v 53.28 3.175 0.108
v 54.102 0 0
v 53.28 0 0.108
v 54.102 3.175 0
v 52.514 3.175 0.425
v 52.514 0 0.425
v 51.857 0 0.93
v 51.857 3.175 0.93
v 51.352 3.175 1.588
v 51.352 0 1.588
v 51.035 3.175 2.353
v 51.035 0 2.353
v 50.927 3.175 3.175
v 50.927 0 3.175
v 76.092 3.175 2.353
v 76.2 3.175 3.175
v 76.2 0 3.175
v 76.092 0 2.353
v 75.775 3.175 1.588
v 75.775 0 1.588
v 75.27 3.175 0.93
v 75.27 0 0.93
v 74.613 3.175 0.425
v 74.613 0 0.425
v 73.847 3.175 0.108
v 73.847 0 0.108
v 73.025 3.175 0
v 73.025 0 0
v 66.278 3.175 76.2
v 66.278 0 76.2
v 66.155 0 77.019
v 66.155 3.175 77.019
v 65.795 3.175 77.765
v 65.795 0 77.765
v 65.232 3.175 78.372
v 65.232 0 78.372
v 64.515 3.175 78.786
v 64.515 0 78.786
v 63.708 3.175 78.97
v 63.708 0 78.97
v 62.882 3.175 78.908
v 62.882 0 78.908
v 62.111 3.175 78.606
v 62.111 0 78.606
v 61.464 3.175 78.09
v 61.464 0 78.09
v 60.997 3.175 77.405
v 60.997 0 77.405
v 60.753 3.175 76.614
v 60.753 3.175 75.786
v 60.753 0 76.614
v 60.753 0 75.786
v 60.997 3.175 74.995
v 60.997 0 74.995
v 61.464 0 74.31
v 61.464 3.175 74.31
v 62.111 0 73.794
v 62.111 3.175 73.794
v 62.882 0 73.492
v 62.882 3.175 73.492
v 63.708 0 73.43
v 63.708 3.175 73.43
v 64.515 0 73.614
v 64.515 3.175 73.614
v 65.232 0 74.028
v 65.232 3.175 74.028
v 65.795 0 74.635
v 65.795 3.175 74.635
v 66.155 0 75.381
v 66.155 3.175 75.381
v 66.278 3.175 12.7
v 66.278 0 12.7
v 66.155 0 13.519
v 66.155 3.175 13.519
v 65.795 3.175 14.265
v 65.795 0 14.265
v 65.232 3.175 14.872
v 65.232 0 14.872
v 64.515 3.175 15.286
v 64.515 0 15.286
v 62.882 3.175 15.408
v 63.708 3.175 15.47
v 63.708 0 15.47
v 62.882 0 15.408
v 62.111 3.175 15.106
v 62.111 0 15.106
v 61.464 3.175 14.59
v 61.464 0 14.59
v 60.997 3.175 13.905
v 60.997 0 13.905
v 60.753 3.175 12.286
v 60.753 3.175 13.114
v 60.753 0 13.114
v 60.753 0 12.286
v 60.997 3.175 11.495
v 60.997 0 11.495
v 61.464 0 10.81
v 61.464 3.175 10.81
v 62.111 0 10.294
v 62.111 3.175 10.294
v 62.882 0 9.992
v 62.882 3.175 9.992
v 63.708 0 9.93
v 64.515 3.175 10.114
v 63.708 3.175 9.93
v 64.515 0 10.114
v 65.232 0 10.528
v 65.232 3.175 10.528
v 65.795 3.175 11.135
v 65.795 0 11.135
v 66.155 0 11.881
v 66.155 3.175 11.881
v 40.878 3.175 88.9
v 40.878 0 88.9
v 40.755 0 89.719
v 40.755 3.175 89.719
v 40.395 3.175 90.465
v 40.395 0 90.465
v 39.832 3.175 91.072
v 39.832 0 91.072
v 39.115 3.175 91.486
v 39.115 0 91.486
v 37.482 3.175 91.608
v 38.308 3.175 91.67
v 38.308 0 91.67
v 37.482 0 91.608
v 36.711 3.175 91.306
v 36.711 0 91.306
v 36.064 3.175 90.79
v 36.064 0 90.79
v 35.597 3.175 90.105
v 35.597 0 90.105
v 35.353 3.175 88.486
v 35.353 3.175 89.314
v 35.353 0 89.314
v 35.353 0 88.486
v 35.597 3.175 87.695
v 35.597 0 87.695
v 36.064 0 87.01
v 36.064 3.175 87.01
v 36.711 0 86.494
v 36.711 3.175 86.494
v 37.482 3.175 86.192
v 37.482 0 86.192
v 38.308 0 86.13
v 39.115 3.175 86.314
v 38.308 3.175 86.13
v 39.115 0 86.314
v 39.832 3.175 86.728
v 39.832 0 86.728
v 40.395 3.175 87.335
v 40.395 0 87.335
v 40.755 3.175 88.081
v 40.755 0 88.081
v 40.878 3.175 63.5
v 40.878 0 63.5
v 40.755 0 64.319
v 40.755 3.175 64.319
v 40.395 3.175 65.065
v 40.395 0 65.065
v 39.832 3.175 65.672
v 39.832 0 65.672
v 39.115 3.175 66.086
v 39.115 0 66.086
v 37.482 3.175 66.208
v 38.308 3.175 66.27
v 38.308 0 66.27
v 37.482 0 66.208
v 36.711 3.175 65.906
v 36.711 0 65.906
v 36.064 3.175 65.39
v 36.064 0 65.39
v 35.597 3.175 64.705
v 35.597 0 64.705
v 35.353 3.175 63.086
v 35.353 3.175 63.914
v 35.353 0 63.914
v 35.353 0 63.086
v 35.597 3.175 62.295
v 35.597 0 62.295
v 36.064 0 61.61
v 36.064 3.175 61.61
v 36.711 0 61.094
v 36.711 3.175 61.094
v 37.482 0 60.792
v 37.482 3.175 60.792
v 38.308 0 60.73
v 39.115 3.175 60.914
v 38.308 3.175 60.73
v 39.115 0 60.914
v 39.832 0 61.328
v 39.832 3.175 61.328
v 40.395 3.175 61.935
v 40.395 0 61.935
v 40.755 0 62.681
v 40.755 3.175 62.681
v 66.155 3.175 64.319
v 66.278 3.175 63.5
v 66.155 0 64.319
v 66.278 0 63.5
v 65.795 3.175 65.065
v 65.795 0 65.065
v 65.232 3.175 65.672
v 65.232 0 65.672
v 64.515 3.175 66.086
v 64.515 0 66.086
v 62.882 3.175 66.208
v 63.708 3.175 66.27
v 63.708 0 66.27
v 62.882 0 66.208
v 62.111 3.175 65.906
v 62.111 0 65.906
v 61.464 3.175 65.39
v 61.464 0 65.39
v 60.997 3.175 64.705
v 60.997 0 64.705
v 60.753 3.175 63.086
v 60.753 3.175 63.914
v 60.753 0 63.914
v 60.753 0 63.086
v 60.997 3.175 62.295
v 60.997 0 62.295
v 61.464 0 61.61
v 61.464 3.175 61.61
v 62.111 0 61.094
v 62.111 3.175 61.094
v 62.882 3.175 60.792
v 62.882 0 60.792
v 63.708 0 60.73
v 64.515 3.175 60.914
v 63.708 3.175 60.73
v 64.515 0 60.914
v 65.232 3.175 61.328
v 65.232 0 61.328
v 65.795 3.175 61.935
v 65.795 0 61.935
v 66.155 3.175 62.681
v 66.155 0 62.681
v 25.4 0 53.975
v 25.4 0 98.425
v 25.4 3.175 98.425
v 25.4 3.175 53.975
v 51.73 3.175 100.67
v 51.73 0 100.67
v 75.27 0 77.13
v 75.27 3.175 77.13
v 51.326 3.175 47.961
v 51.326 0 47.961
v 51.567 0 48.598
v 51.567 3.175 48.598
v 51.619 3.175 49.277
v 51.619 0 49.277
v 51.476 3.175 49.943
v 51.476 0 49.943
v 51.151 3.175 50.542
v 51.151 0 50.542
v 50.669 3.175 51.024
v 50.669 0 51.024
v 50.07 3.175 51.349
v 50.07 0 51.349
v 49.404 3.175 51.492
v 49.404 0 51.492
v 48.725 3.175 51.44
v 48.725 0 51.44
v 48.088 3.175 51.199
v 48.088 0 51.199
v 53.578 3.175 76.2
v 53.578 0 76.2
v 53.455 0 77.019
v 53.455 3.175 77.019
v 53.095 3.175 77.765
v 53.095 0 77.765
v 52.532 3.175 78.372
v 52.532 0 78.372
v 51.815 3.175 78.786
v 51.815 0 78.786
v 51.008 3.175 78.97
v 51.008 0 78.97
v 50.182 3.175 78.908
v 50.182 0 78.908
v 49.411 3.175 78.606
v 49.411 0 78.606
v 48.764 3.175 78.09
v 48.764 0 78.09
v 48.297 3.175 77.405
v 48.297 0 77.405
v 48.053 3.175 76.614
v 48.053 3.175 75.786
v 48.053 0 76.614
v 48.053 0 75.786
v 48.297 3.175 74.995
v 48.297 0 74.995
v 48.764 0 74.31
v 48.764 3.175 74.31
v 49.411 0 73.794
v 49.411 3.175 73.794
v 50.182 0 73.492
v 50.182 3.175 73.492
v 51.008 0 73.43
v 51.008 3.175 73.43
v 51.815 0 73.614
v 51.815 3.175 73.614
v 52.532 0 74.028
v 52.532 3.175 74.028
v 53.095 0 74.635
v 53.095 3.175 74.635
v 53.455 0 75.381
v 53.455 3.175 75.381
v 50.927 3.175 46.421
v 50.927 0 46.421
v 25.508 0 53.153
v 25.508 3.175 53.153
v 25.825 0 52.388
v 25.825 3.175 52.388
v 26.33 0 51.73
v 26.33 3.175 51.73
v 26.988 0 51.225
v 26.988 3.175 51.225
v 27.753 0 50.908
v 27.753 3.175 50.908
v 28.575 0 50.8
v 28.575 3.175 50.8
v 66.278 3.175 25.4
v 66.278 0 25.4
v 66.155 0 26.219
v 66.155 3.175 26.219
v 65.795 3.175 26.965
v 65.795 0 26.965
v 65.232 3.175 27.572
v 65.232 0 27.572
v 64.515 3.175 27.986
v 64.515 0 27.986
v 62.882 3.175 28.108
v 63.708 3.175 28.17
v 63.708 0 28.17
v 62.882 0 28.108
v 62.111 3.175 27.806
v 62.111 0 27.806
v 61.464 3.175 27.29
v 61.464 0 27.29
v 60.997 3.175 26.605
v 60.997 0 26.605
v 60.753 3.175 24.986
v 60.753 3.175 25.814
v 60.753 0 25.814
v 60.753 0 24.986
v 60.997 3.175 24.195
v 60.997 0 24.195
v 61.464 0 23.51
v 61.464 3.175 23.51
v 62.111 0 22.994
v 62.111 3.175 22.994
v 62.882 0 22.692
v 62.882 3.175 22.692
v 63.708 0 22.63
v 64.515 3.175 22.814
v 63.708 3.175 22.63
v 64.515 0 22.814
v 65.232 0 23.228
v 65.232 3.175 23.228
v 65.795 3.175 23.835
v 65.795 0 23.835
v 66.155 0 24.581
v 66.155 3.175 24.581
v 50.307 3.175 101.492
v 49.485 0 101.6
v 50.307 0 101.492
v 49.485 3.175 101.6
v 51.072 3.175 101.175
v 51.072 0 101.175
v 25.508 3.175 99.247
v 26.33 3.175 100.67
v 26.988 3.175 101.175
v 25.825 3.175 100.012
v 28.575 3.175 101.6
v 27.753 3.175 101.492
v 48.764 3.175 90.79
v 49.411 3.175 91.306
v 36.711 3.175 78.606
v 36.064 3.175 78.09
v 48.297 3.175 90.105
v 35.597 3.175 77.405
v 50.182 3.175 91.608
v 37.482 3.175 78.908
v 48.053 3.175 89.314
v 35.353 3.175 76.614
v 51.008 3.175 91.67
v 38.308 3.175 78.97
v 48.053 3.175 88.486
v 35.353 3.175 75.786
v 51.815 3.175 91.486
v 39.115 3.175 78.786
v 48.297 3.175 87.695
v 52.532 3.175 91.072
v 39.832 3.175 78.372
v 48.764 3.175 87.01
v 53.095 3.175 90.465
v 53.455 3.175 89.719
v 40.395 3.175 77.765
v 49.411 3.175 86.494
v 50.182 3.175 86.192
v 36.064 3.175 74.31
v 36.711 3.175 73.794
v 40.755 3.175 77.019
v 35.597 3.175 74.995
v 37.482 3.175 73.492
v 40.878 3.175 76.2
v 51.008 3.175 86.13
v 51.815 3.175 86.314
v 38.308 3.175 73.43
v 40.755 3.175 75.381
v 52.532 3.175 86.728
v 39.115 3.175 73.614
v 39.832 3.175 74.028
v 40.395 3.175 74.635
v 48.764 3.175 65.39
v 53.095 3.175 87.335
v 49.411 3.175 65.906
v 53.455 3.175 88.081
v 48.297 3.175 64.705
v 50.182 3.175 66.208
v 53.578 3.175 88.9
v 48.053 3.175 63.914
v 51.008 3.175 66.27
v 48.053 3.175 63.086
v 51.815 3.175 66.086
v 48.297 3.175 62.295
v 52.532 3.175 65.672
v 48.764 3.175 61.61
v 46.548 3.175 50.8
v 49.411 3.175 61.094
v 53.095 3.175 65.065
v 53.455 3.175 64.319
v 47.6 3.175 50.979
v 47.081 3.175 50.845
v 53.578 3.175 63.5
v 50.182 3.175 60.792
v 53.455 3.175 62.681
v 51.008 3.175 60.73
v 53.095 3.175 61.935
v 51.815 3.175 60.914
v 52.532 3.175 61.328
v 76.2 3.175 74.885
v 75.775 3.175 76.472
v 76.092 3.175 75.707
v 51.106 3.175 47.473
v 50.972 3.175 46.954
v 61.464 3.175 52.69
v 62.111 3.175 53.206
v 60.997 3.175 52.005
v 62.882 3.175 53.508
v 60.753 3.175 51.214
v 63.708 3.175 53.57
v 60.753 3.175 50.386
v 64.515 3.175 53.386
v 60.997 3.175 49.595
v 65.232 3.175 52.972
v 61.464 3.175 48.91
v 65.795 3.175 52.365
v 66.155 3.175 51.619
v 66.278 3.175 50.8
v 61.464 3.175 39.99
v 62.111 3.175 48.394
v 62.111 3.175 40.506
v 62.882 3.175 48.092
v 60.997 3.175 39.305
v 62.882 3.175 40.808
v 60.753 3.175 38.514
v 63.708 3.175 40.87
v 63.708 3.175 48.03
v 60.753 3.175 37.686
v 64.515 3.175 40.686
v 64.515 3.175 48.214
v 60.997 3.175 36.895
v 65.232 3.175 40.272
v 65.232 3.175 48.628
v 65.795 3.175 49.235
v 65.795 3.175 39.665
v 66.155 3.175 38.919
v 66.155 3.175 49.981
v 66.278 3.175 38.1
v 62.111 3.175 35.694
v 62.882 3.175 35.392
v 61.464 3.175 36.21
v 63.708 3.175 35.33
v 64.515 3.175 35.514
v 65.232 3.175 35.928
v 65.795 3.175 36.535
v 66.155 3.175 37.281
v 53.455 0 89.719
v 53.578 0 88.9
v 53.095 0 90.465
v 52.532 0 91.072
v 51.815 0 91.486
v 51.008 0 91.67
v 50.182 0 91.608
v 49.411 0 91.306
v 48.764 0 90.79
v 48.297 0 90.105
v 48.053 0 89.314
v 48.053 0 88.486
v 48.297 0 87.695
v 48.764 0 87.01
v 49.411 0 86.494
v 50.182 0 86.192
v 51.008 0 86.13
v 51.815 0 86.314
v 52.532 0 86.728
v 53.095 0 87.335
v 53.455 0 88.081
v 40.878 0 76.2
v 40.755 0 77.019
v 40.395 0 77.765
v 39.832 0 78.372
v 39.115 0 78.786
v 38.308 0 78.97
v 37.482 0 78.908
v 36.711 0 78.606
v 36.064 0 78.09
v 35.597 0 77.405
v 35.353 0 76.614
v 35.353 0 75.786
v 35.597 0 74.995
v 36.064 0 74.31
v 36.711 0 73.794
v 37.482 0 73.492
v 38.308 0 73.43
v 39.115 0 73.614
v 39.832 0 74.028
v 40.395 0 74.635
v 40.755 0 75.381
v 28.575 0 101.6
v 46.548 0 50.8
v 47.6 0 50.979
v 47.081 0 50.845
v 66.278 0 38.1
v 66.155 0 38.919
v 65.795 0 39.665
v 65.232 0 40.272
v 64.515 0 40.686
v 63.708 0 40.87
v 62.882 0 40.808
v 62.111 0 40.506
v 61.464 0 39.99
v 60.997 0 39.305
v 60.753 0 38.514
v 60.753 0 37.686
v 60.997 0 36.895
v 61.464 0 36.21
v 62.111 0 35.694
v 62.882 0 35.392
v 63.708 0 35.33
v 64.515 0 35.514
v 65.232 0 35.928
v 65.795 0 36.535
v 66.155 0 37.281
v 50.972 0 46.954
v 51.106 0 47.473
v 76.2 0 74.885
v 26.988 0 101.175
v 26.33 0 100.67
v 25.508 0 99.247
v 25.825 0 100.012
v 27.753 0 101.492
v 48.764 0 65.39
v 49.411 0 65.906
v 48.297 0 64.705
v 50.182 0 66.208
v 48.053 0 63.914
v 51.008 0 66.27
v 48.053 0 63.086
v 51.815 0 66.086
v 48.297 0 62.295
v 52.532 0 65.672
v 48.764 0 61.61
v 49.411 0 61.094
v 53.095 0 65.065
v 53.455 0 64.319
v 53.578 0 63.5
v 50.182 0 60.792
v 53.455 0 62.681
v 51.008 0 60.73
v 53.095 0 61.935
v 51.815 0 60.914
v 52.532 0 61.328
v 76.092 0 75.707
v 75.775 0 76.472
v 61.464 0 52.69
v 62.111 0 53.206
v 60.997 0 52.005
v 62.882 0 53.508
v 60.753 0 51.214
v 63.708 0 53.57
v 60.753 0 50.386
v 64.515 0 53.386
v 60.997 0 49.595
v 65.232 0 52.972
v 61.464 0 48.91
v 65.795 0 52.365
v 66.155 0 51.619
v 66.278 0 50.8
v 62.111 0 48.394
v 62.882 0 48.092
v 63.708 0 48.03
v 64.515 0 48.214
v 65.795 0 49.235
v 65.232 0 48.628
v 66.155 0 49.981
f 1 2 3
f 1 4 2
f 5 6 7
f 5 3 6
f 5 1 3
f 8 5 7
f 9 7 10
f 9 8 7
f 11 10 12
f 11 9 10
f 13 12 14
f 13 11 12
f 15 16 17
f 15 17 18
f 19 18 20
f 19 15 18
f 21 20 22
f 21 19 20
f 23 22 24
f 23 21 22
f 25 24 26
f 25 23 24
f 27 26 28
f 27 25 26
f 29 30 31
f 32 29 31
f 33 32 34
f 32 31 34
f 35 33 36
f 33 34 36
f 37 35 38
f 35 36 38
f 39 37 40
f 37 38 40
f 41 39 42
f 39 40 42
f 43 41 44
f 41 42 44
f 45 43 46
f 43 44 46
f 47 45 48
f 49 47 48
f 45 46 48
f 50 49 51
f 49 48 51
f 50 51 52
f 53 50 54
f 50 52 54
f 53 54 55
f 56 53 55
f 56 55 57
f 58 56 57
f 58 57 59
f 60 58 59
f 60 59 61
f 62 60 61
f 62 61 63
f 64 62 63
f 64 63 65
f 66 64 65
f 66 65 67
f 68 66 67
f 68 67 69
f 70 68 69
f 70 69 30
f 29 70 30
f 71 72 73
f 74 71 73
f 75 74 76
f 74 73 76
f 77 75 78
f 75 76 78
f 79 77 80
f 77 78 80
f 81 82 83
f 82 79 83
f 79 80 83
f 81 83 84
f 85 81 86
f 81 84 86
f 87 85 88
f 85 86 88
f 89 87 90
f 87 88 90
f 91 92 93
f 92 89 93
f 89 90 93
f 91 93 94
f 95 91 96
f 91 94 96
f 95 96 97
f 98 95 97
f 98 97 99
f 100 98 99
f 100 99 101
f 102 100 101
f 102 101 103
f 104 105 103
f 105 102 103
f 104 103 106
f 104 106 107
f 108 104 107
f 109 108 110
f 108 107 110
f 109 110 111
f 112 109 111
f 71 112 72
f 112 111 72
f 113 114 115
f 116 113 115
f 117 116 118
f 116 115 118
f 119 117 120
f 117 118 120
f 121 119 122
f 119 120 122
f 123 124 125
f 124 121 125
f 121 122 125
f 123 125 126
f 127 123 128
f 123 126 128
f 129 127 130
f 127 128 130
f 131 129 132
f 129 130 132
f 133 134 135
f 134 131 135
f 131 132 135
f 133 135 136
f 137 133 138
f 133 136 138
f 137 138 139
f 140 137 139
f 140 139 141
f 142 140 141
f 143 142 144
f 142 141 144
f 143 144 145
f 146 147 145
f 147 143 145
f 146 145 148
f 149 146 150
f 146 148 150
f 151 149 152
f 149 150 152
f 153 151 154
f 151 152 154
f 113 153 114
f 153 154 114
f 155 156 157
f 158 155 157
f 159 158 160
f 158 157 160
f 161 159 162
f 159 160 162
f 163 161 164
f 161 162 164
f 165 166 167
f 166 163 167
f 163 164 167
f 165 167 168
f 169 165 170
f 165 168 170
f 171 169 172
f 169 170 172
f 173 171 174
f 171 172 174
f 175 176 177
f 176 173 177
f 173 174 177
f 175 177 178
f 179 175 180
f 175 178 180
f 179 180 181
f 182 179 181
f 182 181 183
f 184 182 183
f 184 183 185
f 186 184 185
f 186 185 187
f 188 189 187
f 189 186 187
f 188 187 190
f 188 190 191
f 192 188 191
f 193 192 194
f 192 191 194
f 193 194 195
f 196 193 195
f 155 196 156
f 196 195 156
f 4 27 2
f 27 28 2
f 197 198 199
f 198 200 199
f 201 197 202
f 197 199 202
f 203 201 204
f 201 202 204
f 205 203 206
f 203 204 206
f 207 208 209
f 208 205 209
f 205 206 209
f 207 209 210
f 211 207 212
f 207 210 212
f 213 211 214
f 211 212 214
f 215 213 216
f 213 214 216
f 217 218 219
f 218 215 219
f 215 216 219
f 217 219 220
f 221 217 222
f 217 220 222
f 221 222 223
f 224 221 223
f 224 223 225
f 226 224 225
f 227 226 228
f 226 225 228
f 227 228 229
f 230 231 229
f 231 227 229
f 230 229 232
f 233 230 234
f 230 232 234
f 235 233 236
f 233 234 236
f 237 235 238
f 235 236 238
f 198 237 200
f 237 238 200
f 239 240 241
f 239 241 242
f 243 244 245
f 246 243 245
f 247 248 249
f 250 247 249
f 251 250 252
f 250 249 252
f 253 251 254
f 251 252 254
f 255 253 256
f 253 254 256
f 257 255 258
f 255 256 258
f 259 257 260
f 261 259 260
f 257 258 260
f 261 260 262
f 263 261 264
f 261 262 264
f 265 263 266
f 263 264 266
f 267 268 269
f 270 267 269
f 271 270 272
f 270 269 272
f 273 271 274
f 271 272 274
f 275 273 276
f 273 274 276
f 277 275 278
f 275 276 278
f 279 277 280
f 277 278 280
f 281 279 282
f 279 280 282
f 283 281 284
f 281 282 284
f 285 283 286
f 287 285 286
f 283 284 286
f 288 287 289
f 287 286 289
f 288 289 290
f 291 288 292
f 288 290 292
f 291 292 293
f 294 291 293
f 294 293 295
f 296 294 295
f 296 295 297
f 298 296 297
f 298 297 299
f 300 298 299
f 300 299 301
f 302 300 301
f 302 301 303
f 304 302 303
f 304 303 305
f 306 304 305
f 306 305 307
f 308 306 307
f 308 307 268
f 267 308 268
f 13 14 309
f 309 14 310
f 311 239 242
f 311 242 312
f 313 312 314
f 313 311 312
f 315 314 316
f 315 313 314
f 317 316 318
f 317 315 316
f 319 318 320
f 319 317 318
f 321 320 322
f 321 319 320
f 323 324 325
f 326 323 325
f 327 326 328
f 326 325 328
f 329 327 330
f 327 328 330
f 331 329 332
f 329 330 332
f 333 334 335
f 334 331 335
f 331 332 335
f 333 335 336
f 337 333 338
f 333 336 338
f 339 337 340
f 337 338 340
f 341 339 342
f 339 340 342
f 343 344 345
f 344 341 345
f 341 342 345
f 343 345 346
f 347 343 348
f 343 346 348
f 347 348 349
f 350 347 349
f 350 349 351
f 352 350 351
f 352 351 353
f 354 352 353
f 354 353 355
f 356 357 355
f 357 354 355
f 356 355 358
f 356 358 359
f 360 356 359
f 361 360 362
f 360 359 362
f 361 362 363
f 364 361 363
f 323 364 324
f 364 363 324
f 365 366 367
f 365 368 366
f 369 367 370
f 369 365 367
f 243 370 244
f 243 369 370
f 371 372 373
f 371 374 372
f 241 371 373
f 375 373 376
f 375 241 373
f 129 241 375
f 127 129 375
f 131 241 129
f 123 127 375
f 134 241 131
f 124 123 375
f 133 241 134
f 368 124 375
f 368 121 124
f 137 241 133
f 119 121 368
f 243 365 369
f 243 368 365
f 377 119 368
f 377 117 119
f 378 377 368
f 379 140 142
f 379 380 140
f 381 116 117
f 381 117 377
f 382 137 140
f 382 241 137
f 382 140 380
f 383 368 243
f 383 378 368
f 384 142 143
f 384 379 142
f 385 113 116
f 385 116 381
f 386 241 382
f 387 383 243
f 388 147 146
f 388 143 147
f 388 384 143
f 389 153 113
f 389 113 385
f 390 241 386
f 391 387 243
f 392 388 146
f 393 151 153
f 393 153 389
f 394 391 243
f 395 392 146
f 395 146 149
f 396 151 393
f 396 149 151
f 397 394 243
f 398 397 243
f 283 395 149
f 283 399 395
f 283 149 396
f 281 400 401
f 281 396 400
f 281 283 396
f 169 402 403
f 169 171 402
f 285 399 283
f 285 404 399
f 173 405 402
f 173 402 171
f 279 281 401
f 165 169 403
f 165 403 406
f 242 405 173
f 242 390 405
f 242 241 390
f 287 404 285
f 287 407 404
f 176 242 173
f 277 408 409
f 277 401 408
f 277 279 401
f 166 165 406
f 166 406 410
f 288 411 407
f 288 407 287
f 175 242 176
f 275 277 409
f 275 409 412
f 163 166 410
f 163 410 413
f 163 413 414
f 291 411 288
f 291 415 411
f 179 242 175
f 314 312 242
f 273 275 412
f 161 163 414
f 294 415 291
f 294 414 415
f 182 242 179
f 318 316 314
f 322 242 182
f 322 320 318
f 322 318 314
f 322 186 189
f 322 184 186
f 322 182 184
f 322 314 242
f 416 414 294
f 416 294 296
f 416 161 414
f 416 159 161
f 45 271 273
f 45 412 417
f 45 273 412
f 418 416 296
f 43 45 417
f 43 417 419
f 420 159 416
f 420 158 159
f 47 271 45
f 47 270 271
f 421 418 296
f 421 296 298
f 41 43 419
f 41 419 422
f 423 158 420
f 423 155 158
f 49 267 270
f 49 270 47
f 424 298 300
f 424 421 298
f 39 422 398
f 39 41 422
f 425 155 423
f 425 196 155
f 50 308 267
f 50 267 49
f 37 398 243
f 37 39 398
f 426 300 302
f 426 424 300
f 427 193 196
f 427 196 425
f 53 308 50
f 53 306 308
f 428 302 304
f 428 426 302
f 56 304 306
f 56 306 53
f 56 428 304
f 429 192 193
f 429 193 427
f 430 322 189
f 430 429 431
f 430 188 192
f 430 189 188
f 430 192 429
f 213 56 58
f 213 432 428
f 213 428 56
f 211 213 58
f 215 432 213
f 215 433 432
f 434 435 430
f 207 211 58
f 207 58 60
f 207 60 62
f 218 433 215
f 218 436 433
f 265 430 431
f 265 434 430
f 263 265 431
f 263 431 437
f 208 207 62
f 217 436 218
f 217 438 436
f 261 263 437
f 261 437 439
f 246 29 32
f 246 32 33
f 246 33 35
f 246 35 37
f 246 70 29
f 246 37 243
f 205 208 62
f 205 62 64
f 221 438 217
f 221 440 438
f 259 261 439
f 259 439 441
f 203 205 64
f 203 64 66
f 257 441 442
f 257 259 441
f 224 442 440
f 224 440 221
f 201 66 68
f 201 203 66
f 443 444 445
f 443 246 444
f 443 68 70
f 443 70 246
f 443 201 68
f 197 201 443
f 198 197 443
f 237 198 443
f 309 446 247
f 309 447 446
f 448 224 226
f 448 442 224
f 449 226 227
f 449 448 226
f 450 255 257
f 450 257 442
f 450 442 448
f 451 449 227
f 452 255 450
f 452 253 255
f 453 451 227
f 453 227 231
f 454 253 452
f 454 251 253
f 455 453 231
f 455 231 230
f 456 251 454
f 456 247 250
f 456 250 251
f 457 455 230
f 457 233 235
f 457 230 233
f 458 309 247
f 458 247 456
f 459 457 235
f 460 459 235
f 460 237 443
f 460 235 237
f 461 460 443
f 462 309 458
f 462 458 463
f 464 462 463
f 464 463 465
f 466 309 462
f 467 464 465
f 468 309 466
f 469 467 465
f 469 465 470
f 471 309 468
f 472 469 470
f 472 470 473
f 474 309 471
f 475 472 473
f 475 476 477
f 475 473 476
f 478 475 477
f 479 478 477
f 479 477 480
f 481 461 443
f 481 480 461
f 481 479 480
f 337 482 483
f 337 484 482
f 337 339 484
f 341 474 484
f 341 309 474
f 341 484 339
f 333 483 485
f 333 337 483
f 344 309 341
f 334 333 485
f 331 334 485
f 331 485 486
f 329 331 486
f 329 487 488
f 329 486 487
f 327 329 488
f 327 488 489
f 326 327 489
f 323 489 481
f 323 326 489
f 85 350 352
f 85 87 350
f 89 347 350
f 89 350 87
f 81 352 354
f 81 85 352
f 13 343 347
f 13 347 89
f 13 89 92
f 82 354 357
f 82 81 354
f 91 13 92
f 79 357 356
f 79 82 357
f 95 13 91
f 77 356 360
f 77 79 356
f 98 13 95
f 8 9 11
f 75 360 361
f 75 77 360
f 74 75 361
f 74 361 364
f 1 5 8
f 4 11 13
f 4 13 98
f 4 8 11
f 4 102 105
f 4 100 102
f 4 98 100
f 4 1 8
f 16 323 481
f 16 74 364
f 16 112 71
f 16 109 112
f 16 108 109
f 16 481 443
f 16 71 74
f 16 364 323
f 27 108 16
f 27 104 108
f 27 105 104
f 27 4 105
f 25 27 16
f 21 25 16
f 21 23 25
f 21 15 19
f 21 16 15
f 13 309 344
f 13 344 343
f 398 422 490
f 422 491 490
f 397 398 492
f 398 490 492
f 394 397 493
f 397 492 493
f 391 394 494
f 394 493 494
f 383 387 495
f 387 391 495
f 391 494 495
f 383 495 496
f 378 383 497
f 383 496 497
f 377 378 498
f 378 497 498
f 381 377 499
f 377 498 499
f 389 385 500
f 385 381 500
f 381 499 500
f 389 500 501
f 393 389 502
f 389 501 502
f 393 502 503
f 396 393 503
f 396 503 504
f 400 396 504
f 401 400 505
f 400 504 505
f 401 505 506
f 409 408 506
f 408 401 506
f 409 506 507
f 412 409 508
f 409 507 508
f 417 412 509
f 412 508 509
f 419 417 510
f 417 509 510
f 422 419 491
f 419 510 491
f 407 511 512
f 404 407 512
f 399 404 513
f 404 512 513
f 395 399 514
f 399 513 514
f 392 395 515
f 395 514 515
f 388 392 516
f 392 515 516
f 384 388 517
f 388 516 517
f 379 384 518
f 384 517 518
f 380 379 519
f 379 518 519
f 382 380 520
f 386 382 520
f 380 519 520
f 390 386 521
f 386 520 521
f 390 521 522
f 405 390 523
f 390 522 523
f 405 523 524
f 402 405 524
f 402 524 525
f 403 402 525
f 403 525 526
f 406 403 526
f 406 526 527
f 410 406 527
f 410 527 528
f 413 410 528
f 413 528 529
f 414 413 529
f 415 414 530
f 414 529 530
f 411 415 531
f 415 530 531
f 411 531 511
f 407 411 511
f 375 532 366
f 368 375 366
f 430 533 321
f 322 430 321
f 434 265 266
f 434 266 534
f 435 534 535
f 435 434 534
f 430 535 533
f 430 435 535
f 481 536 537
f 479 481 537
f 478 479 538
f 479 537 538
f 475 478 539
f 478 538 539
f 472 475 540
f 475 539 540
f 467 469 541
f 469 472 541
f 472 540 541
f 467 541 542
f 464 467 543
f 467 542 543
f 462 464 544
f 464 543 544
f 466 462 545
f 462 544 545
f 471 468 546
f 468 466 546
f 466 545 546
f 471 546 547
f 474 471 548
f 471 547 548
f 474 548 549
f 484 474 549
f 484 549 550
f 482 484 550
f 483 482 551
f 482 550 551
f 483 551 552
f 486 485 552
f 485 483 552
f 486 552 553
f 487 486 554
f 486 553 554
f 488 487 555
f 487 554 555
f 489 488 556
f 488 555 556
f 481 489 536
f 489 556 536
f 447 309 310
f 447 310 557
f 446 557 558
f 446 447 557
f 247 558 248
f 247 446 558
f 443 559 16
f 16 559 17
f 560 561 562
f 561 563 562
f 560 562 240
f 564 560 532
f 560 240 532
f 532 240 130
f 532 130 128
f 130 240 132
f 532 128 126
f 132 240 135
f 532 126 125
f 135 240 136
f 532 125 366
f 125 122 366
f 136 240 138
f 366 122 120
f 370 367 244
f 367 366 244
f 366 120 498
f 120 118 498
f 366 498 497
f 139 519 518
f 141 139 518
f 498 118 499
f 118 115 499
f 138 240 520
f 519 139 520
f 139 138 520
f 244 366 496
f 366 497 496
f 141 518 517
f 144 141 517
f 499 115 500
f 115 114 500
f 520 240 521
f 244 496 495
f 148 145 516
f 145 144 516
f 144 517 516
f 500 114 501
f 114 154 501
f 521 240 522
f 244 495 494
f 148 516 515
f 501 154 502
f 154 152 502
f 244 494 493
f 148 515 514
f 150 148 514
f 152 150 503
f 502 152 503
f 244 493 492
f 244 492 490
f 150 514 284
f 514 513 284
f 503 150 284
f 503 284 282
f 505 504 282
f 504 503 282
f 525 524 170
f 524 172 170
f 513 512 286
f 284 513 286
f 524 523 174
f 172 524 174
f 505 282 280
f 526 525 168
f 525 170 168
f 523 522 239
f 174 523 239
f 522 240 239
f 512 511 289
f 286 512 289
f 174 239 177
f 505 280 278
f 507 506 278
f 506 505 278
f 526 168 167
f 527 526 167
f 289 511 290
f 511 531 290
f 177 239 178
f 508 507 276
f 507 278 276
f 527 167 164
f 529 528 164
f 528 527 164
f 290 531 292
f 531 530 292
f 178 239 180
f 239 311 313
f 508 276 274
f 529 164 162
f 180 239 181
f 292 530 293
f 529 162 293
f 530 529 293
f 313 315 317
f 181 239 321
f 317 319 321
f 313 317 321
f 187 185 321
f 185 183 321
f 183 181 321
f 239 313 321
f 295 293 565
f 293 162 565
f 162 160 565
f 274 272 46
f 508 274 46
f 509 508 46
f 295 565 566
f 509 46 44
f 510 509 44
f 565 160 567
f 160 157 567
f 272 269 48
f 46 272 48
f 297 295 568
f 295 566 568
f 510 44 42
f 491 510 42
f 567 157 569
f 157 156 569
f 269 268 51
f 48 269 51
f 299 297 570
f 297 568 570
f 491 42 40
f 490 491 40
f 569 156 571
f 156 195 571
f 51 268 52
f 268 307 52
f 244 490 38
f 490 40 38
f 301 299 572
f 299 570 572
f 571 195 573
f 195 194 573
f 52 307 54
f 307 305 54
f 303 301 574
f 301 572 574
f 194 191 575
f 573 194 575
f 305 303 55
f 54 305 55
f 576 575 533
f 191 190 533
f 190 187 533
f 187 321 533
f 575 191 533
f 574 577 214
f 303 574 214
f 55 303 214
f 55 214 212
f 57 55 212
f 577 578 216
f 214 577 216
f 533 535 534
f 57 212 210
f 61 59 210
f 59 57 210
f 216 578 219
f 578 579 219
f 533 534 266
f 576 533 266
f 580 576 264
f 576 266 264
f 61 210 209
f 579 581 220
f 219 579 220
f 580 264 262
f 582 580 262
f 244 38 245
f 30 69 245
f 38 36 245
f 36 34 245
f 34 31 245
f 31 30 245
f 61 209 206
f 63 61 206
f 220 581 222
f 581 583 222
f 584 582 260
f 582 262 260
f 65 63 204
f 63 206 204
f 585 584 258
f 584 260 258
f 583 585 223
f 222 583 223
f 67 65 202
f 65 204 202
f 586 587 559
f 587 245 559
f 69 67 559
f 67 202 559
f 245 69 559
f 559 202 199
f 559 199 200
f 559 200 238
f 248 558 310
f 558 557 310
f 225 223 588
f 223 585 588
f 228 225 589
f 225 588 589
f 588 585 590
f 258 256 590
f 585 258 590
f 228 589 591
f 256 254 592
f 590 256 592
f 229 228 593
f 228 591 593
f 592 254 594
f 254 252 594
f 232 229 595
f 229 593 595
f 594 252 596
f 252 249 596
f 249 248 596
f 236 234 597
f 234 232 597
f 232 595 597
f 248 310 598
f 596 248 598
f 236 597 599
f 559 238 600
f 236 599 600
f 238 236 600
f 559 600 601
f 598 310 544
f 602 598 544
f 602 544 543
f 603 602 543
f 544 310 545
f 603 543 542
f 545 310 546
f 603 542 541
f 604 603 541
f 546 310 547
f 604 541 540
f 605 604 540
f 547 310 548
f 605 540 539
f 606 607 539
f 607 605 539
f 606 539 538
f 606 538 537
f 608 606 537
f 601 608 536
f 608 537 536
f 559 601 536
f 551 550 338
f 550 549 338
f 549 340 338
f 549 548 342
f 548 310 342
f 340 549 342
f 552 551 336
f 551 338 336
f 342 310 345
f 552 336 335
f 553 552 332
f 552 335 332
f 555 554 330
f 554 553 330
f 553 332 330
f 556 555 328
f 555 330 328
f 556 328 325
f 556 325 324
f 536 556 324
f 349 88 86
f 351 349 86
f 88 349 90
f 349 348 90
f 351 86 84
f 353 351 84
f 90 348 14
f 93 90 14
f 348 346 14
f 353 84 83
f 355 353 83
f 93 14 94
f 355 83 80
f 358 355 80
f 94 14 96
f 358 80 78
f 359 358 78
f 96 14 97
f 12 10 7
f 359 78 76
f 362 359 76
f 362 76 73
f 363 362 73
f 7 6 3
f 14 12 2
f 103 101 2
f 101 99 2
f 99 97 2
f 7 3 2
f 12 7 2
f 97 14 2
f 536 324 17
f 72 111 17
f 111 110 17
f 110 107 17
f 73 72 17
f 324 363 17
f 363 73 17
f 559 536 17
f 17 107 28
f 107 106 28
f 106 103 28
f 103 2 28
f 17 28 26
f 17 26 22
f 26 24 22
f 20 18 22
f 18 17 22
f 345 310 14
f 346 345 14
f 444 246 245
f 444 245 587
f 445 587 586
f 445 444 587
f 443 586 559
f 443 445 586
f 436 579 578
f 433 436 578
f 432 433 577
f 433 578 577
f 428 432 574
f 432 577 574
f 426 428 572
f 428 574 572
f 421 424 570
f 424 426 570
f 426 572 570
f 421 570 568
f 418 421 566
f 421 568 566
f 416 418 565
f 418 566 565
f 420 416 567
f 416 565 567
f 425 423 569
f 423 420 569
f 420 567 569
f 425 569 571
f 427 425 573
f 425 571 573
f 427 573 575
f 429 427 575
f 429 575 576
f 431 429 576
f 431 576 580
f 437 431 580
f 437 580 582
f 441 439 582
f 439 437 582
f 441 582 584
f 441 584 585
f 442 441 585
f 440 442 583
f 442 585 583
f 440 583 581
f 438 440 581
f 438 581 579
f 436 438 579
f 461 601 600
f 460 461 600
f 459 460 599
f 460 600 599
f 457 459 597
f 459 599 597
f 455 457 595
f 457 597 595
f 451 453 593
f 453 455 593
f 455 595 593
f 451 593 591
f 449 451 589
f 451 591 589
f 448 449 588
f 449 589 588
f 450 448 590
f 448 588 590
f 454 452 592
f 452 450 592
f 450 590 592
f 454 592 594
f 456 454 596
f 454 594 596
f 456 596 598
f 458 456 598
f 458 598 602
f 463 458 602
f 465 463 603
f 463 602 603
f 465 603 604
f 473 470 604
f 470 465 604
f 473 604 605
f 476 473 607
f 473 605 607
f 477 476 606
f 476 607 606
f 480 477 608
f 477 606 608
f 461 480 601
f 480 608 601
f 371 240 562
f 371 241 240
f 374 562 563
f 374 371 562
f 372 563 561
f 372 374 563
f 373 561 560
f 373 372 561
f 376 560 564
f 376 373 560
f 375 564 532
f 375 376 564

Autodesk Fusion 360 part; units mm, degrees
sketch "Sketch1" plane through (0, 0, 0) normal (0, 1, 0) x (1, 0, 0)
  line L0 (0, 0) -> (0, -76.2)
  line L1 (0, -76.2) -> (76.2, -76.2)
  line L2 (76.2, -76.2) -> (76.2, 0)
  line L3 (76.2, 0) -> (50.927, 0)
  line L4 (50.927, 0) -> (50.927, -50.8)
  line L5 (50.927, -50.8) -> (25.273, -50.8)
  line L6 (25.273, -50.8) -> (25.273, 0)
  line L7 (25.273, 0) -> (0, 0)
  line L8 (12.7, 0) -> (12.7, -76.2) construction
  line L9 (38.1, -50.8) -> (38.1, -76.2) construction
  circle A0 centre (26.9568, -49.1162) radius 2.3813
  line L10 (26.9568, -49.1162) -> (26.9568, -50.8) construction
  line L11 (26.9568, -49.1162) -> (25.273, -49.1162) construction
  circle A1 centre (12.7, -12.7) radius 2.7781
  circle A2 centre (12.7, -25.4) radius 2.7781
  line L12 (12.7, -12.7) -> (12.7, -88.9) construction
  circle A3 centre (12.7, -38.1) radius 2.7781
  line L13 (12.7, -25.4) -> (12.7, -101.6) construction
  circle A4 centre (12.7, -50.8) radius 2.7781
  line L14 (12.7, -38.1) -> (12.7, -114.3) construction
  circle A5 centre (12.7, -63.5) radius 2.7781
  line L15 (12.7, -50.8) -> (12.7, -127) construction
  circle A6 centre (63.5, -38.1) radius 2.7781
  circle A7 centre (63.5, -50.8) radius 2.7781
  circle A8 centre (63.5, -63.5) radius 2.7781
  circle A9 centre (63.5, -25.4) radius 2.7781
  circle A10 centre (63.5, -12.7) radius 2.7781
  circle A11 centre (49.2432, -49.1162) radius 2.3813
  circle A12 centre (38.1, -63.5) radius 2.7781
  line L16 (0, -76.2) -> (25.4, -101.6)
  line L17 (25.4, -101.6) -> (50.8, -101.6)
  line L18 (50.8, -101.6) -> (76.2, -76.2)
  circle A13 centre (38.1, -76.2) radius 2.7781
  circle A14 centre (38.1, -88.9) radius 2.7781
  circle A15 centre (25.4, -63.5) radius 2.7781
  circle A16 centre (25.4, -76.2) radius 2.7781
  circle A17 centre (25.4, -88.9) radius 2.7781
  circle A18 centre (12.7, -76.2) radius 2.7781
  circle A19 centre (50.8, -63.5) radius 2.7781
  circle A20 centre (50.8, -76.2) radius 2.7781
  circle A21 centre (50.8, -88.9) radius 2.7781
  circle A22 centre (63.5, -76.2) radius 2.7781
  dimension "d1" = 76.2
  dimension "d3" = 25.654
  dimension "d4" = 50.8
  dimension "d6" = 76.2
  dimension "d7" = 12.7
  dimension "d8" = 4.7625
  dimension "d9" = 5.5563
  dimension "d10" = 12.7
  dimension "d13" = 0
  dimension "d14" = -50.8
  dimension "d17" = 25.4
  dimension "d18" = 0
  dimension "d25" = 25.4
  dimension "d26" = 25.4
  dimension "d29" = 25.4
  dimension "d30" = 0
  dimension "d33" = 12.7
  dimension "d34" = 0
  dimension "d37" = 0
  dimension "d38" = -25.4
  dimension "d41" = 0
  dimension "d42" = -12.7
extrude "Extrude1" add sketch "Sketch1" along normal blind 3.175 contours L0 L1 L2 L3 L4 L5 L6 L7 A0 A11 A13 A16 A18 A20 A22 | L1 L16 L17 L18 A13 A16 A18 A20 A22 | L1 A18 | L1 A18 | L6 A0 | L5 A0 | L1 A16 | L1 A16 | A1 | A2 | A3 | A4 | A5 | A15 | A17 makes body 1
ref_plane "WorkPlane1" through (25.4, 1.5875, 38.1) normal (-1, 0, 0) x (0, 0, 1)
split "Split1" by plane through (25.4, 1.5875, 38.1) normal (-1, 0, 0) bodies 1 makes body 2 at (8.4243, 0, 42.3333)
delete_body "RemoveBody1" bodies 2
fillet "Fillet1" radius 3.175 6 edges at (50.927, 1.5875, 0) (76.2, 1.5875, 0) (50.8, 1.5875, 101.6) (76.2, 1.5875, 76.2) (25.4, 1.5875, 101.6) (25.4, 1.5875, 50.8) on bodies 1
fillet "Fillet1" radius 3.175 2 edges at (47.5594, 1.5875, 50.8) (50.927, 1.5875, 47.4324) on bodies 1
sketch "DXF" plane through (0, 0, 0) normal (0, -1, 0) x (1, 0, 0)
  arc A0 (51.3255, 47.9611) -> (50.927, 46.421) centre (54.102, 46.421) ccw
  line L0 (50.927, 46.421) -> (50.927, 3.175)
  arc A1 (50.927, 3.175) -> (54.102, 0) centre (54.102, 3.175) ccw
  line L1 (54.102, 0) -> (73.025, 0)
  arc A2 (73.025, 0) -> (76.2, 3.175) centre (73.025, 3.175) ccw
  line L2 (76.2, 3.175) -> (76.2, 74.8849)
  arc A3 (76.2, 74.8849) -> (75.2701, 77.1299) centre (73.025, 74.8849) ccw
  line L3 (75.2701, 77.1299) -> (51.7299, 100.6701)
  arc A4 (51.7299, 100.6701) -> (49.4849, 101.6) centre (49.4849, 98.425) ccw
  line L4 (49.4849, 101.6) -> (28.575, 101.6)
  arc A5 (28.575, 101.6) -> (25.4, 98.425) centre (28.575, 98.425) ccw
  line L5 (25.4, 98.425) -> (25.4, 53.975)
  arc A6 (25.4, 53.975) -> (28.575, 50.8) centre (28.575, 53.975) ccw
  line L6 (28.575, 50.8) -> (46.548, 50.8)
  arc A7 (46.548, 50.8) -> (48.0881, 51.1985) centre (46.548, 53.975) ccw
  arc A8 (51.3255, 47.9611) -> (48.0881, 51.1985) centre (49.2432, 49.1162) ccw
  circle A9 centre (50.8, 88.9) radius 2.7781
  circle A10 centre (50.8, 63.5) radius 2.7781
  circle A11 centre (63.5, 25.4) radius 2.7781
  circle A12 centre (38.1, 88.9) radius 2.7781
  circle A13 centre (38.1, 63.5) radius 2.7781
  circle A14 centre (63.5, 50.8) radius 2.7781
  circle A15 centre (63.5, 63.5) radius 2.7781
  circle A16 centre (63.5, 38.1) radius 2.7781
  circle A17 centre (50.8, 76.2) radius 2.7781
  circle A18 centre (38.1, 76.2) radius 2.7781
  circle A19 centre (63.5, 12.7) radius 2.7781
  circle A20 centre (63.5, 76.2) radius 2.7781
equation "TOLERANCE = 0.01 in"
equation "d3 = 1 in + TOLERANCE"
equation "d9 = ( 7 / 32 ) * 1 in"
